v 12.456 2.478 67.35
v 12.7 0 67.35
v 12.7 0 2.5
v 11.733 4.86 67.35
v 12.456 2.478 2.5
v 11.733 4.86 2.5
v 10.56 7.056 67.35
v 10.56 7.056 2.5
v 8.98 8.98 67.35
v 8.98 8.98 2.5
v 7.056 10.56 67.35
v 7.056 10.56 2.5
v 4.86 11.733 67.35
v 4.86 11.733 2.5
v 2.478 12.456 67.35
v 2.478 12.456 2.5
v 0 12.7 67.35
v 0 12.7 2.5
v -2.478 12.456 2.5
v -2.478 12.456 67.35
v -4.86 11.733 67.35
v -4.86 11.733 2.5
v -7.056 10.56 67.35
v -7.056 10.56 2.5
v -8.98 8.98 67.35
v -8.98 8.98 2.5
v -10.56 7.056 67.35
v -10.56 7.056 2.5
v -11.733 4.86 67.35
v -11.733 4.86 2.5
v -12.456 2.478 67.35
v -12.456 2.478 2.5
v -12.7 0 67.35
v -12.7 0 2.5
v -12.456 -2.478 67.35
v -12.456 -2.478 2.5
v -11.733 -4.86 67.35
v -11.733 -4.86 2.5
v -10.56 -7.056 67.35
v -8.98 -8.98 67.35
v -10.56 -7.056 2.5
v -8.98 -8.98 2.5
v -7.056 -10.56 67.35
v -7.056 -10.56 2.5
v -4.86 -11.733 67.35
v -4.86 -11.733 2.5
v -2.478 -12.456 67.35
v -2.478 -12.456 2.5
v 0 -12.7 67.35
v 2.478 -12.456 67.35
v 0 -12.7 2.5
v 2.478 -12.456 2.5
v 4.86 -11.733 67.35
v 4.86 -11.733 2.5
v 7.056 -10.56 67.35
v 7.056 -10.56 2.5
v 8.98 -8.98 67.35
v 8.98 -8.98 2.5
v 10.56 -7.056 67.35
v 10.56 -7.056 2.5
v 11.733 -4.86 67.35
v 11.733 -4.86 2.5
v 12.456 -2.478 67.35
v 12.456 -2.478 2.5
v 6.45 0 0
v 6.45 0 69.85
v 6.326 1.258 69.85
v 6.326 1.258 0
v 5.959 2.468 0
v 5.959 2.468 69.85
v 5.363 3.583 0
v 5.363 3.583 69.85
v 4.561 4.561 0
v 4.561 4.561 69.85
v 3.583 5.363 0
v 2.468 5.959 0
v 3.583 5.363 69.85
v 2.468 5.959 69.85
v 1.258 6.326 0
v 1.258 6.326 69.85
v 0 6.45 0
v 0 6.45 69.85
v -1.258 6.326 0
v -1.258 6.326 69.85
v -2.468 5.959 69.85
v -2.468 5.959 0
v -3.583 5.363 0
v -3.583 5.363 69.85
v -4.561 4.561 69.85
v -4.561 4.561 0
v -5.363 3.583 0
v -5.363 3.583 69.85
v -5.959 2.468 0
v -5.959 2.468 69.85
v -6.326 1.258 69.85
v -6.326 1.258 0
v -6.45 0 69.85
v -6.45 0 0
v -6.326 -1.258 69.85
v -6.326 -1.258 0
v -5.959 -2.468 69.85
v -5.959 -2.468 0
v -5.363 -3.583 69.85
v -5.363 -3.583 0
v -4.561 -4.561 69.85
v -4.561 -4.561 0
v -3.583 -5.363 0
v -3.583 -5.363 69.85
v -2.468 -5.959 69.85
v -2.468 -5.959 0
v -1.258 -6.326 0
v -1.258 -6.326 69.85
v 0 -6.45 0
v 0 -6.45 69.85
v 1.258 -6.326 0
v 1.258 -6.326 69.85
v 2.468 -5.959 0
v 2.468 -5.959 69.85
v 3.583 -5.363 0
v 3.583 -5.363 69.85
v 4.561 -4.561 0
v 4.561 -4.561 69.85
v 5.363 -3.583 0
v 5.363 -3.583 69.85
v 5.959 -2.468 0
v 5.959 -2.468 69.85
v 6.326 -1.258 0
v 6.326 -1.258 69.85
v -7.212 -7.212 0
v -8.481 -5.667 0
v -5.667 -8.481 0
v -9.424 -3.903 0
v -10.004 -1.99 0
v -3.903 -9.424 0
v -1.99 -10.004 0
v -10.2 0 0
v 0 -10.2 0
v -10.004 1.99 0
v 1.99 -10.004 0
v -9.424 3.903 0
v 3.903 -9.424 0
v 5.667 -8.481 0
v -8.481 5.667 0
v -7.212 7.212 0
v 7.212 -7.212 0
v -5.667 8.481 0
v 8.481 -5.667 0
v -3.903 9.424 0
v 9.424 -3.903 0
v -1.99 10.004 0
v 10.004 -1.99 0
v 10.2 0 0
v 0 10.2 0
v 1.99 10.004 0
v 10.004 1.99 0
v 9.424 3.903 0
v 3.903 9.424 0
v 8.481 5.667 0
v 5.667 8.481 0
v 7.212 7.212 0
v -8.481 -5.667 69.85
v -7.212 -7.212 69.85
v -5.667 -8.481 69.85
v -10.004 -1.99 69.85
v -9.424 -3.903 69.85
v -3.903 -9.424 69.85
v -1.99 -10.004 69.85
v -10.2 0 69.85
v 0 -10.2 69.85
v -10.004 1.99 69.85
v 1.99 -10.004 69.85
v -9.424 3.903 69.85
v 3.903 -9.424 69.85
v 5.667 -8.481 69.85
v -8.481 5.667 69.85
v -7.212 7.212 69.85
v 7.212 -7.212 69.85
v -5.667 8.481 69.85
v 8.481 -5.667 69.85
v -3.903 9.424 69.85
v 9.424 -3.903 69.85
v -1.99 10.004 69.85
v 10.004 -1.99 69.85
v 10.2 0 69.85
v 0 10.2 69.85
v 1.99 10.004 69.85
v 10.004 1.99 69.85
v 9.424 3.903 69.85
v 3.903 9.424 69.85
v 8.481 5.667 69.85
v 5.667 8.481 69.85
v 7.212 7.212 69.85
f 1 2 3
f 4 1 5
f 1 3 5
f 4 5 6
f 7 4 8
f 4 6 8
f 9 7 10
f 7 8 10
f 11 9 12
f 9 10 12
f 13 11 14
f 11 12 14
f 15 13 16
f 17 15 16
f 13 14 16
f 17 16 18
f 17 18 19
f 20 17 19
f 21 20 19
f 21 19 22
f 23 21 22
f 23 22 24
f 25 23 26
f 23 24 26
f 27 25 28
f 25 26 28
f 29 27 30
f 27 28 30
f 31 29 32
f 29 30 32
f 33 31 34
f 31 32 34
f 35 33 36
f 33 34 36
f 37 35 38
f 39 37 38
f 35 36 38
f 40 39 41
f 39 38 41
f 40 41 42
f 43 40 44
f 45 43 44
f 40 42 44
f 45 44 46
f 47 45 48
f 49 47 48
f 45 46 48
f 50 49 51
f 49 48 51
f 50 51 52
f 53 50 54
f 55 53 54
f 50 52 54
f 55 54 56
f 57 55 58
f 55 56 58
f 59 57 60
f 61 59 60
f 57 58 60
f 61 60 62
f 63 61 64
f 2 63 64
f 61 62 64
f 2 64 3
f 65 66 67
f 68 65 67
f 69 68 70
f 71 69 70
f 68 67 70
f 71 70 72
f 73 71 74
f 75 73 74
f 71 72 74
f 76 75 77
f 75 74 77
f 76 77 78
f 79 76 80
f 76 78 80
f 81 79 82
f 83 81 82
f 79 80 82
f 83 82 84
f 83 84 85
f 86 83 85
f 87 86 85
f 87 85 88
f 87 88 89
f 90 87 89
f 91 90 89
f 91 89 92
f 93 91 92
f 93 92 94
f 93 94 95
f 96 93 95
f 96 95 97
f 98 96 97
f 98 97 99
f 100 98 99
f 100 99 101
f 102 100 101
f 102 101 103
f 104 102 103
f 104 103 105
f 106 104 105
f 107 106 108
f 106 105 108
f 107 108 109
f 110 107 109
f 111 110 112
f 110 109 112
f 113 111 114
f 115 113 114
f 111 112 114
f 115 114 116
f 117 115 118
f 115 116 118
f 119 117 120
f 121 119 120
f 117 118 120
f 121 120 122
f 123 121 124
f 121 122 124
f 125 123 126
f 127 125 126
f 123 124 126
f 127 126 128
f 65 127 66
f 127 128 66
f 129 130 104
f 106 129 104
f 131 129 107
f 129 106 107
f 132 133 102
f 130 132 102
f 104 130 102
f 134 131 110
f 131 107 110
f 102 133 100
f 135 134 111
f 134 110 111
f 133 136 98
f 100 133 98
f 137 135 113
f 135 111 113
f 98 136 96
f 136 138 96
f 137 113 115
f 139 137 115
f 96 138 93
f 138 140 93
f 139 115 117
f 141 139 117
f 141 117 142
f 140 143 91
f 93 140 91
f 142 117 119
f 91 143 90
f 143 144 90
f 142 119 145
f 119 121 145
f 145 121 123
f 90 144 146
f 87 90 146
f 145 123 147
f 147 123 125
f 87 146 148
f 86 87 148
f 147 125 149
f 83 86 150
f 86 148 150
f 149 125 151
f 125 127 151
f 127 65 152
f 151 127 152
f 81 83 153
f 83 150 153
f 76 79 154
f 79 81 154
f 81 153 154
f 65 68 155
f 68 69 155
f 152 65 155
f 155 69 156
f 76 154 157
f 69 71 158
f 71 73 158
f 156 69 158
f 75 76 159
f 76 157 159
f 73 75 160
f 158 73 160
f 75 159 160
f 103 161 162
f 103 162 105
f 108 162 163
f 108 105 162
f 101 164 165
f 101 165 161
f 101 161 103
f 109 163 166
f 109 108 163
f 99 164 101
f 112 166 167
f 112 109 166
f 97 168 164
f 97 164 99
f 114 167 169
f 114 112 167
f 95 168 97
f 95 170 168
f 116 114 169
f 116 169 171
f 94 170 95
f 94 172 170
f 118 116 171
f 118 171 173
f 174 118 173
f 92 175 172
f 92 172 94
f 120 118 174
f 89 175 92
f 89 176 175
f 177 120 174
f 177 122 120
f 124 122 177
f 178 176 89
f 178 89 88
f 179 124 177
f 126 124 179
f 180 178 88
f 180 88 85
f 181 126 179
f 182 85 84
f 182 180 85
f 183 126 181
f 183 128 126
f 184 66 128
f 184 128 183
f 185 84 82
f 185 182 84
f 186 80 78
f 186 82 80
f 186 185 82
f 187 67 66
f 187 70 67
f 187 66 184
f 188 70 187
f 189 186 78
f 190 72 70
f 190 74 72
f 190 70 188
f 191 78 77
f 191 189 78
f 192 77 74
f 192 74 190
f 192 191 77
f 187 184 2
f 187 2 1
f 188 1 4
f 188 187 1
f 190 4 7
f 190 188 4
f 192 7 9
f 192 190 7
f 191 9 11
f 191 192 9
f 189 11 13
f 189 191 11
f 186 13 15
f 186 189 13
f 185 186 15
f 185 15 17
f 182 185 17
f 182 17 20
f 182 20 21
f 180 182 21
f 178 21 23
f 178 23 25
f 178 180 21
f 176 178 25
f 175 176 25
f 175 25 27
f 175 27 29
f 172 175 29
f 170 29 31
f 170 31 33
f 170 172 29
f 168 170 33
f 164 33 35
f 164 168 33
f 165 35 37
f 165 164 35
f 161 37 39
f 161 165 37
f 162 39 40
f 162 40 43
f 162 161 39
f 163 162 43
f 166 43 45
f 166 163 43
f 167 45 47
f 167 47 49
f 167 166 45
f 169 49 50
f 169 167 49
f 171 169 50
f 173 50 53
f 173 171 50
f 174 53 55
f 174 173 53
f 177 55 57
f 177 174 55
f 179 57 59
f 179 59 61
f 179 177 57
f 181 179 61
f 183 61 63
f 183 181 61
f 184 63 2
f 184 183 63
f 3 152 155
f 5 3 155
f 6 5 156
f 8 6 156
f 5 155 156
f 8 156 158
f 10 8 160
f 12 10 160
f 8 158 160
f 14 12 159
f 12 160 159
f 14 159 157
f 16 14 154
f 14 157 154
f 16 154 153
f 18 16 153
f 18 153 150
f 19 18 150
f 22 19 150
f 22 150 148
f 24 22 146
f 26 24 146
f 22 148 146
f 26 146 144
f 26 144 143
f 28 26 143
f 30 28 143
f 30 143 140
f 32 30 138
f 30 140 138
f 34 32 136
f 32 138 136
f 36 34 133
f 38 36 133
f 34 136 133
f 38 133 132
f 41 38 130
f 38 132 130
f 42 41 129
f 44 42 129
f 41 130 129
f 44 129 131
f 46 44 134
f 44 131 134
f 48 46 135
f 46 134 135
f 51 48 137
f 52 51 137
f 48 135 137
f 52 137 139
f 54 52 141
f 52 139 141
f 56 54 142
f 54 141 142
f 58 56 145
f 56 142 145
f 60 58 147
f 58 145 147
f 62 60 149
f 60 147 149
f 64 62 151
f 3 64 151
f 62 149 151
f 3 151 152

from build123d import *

# Parameters (mm, degrees)
SKETCH2_R           = 12.7
BOSS_EXTRUDE1_DEPTH = 69.85
SKETCH3_R           = 6.45
CUT_EXTRUDE1_DEPTH  = 70.85
CHAMFER1_SIZE       = 2.5


with BuildPart() as part:
    # Sketch2 → Boss-Extrude1 (new body)
    with BuildSketch(Plane.XY):
        Circle(SKETCH2_R)
    extrude(amount=BOSS_EXTRUDE1_DEPTH)

    # Sketch3 → Cut-Extrude1 (cut, through all)
    with BuildSketch(Plane.XY.offset(69.85)):
        Circle(SKETCH3_R)
    extrude(amount=-CUT_EXTRUDE1_DEPTH, mode=Mode.SUBTRACT)

    # Chamfer1
    chamfer1_edges = [part.edges().sort_by_distance(p)[0] for p in [
        (-12.7, 0, 0),
        (-12.7, 0, 69.85),
    ]]
    chamfer(chamfer1_edges, length=CHAMFER1_SIZE)


solid = part.part
